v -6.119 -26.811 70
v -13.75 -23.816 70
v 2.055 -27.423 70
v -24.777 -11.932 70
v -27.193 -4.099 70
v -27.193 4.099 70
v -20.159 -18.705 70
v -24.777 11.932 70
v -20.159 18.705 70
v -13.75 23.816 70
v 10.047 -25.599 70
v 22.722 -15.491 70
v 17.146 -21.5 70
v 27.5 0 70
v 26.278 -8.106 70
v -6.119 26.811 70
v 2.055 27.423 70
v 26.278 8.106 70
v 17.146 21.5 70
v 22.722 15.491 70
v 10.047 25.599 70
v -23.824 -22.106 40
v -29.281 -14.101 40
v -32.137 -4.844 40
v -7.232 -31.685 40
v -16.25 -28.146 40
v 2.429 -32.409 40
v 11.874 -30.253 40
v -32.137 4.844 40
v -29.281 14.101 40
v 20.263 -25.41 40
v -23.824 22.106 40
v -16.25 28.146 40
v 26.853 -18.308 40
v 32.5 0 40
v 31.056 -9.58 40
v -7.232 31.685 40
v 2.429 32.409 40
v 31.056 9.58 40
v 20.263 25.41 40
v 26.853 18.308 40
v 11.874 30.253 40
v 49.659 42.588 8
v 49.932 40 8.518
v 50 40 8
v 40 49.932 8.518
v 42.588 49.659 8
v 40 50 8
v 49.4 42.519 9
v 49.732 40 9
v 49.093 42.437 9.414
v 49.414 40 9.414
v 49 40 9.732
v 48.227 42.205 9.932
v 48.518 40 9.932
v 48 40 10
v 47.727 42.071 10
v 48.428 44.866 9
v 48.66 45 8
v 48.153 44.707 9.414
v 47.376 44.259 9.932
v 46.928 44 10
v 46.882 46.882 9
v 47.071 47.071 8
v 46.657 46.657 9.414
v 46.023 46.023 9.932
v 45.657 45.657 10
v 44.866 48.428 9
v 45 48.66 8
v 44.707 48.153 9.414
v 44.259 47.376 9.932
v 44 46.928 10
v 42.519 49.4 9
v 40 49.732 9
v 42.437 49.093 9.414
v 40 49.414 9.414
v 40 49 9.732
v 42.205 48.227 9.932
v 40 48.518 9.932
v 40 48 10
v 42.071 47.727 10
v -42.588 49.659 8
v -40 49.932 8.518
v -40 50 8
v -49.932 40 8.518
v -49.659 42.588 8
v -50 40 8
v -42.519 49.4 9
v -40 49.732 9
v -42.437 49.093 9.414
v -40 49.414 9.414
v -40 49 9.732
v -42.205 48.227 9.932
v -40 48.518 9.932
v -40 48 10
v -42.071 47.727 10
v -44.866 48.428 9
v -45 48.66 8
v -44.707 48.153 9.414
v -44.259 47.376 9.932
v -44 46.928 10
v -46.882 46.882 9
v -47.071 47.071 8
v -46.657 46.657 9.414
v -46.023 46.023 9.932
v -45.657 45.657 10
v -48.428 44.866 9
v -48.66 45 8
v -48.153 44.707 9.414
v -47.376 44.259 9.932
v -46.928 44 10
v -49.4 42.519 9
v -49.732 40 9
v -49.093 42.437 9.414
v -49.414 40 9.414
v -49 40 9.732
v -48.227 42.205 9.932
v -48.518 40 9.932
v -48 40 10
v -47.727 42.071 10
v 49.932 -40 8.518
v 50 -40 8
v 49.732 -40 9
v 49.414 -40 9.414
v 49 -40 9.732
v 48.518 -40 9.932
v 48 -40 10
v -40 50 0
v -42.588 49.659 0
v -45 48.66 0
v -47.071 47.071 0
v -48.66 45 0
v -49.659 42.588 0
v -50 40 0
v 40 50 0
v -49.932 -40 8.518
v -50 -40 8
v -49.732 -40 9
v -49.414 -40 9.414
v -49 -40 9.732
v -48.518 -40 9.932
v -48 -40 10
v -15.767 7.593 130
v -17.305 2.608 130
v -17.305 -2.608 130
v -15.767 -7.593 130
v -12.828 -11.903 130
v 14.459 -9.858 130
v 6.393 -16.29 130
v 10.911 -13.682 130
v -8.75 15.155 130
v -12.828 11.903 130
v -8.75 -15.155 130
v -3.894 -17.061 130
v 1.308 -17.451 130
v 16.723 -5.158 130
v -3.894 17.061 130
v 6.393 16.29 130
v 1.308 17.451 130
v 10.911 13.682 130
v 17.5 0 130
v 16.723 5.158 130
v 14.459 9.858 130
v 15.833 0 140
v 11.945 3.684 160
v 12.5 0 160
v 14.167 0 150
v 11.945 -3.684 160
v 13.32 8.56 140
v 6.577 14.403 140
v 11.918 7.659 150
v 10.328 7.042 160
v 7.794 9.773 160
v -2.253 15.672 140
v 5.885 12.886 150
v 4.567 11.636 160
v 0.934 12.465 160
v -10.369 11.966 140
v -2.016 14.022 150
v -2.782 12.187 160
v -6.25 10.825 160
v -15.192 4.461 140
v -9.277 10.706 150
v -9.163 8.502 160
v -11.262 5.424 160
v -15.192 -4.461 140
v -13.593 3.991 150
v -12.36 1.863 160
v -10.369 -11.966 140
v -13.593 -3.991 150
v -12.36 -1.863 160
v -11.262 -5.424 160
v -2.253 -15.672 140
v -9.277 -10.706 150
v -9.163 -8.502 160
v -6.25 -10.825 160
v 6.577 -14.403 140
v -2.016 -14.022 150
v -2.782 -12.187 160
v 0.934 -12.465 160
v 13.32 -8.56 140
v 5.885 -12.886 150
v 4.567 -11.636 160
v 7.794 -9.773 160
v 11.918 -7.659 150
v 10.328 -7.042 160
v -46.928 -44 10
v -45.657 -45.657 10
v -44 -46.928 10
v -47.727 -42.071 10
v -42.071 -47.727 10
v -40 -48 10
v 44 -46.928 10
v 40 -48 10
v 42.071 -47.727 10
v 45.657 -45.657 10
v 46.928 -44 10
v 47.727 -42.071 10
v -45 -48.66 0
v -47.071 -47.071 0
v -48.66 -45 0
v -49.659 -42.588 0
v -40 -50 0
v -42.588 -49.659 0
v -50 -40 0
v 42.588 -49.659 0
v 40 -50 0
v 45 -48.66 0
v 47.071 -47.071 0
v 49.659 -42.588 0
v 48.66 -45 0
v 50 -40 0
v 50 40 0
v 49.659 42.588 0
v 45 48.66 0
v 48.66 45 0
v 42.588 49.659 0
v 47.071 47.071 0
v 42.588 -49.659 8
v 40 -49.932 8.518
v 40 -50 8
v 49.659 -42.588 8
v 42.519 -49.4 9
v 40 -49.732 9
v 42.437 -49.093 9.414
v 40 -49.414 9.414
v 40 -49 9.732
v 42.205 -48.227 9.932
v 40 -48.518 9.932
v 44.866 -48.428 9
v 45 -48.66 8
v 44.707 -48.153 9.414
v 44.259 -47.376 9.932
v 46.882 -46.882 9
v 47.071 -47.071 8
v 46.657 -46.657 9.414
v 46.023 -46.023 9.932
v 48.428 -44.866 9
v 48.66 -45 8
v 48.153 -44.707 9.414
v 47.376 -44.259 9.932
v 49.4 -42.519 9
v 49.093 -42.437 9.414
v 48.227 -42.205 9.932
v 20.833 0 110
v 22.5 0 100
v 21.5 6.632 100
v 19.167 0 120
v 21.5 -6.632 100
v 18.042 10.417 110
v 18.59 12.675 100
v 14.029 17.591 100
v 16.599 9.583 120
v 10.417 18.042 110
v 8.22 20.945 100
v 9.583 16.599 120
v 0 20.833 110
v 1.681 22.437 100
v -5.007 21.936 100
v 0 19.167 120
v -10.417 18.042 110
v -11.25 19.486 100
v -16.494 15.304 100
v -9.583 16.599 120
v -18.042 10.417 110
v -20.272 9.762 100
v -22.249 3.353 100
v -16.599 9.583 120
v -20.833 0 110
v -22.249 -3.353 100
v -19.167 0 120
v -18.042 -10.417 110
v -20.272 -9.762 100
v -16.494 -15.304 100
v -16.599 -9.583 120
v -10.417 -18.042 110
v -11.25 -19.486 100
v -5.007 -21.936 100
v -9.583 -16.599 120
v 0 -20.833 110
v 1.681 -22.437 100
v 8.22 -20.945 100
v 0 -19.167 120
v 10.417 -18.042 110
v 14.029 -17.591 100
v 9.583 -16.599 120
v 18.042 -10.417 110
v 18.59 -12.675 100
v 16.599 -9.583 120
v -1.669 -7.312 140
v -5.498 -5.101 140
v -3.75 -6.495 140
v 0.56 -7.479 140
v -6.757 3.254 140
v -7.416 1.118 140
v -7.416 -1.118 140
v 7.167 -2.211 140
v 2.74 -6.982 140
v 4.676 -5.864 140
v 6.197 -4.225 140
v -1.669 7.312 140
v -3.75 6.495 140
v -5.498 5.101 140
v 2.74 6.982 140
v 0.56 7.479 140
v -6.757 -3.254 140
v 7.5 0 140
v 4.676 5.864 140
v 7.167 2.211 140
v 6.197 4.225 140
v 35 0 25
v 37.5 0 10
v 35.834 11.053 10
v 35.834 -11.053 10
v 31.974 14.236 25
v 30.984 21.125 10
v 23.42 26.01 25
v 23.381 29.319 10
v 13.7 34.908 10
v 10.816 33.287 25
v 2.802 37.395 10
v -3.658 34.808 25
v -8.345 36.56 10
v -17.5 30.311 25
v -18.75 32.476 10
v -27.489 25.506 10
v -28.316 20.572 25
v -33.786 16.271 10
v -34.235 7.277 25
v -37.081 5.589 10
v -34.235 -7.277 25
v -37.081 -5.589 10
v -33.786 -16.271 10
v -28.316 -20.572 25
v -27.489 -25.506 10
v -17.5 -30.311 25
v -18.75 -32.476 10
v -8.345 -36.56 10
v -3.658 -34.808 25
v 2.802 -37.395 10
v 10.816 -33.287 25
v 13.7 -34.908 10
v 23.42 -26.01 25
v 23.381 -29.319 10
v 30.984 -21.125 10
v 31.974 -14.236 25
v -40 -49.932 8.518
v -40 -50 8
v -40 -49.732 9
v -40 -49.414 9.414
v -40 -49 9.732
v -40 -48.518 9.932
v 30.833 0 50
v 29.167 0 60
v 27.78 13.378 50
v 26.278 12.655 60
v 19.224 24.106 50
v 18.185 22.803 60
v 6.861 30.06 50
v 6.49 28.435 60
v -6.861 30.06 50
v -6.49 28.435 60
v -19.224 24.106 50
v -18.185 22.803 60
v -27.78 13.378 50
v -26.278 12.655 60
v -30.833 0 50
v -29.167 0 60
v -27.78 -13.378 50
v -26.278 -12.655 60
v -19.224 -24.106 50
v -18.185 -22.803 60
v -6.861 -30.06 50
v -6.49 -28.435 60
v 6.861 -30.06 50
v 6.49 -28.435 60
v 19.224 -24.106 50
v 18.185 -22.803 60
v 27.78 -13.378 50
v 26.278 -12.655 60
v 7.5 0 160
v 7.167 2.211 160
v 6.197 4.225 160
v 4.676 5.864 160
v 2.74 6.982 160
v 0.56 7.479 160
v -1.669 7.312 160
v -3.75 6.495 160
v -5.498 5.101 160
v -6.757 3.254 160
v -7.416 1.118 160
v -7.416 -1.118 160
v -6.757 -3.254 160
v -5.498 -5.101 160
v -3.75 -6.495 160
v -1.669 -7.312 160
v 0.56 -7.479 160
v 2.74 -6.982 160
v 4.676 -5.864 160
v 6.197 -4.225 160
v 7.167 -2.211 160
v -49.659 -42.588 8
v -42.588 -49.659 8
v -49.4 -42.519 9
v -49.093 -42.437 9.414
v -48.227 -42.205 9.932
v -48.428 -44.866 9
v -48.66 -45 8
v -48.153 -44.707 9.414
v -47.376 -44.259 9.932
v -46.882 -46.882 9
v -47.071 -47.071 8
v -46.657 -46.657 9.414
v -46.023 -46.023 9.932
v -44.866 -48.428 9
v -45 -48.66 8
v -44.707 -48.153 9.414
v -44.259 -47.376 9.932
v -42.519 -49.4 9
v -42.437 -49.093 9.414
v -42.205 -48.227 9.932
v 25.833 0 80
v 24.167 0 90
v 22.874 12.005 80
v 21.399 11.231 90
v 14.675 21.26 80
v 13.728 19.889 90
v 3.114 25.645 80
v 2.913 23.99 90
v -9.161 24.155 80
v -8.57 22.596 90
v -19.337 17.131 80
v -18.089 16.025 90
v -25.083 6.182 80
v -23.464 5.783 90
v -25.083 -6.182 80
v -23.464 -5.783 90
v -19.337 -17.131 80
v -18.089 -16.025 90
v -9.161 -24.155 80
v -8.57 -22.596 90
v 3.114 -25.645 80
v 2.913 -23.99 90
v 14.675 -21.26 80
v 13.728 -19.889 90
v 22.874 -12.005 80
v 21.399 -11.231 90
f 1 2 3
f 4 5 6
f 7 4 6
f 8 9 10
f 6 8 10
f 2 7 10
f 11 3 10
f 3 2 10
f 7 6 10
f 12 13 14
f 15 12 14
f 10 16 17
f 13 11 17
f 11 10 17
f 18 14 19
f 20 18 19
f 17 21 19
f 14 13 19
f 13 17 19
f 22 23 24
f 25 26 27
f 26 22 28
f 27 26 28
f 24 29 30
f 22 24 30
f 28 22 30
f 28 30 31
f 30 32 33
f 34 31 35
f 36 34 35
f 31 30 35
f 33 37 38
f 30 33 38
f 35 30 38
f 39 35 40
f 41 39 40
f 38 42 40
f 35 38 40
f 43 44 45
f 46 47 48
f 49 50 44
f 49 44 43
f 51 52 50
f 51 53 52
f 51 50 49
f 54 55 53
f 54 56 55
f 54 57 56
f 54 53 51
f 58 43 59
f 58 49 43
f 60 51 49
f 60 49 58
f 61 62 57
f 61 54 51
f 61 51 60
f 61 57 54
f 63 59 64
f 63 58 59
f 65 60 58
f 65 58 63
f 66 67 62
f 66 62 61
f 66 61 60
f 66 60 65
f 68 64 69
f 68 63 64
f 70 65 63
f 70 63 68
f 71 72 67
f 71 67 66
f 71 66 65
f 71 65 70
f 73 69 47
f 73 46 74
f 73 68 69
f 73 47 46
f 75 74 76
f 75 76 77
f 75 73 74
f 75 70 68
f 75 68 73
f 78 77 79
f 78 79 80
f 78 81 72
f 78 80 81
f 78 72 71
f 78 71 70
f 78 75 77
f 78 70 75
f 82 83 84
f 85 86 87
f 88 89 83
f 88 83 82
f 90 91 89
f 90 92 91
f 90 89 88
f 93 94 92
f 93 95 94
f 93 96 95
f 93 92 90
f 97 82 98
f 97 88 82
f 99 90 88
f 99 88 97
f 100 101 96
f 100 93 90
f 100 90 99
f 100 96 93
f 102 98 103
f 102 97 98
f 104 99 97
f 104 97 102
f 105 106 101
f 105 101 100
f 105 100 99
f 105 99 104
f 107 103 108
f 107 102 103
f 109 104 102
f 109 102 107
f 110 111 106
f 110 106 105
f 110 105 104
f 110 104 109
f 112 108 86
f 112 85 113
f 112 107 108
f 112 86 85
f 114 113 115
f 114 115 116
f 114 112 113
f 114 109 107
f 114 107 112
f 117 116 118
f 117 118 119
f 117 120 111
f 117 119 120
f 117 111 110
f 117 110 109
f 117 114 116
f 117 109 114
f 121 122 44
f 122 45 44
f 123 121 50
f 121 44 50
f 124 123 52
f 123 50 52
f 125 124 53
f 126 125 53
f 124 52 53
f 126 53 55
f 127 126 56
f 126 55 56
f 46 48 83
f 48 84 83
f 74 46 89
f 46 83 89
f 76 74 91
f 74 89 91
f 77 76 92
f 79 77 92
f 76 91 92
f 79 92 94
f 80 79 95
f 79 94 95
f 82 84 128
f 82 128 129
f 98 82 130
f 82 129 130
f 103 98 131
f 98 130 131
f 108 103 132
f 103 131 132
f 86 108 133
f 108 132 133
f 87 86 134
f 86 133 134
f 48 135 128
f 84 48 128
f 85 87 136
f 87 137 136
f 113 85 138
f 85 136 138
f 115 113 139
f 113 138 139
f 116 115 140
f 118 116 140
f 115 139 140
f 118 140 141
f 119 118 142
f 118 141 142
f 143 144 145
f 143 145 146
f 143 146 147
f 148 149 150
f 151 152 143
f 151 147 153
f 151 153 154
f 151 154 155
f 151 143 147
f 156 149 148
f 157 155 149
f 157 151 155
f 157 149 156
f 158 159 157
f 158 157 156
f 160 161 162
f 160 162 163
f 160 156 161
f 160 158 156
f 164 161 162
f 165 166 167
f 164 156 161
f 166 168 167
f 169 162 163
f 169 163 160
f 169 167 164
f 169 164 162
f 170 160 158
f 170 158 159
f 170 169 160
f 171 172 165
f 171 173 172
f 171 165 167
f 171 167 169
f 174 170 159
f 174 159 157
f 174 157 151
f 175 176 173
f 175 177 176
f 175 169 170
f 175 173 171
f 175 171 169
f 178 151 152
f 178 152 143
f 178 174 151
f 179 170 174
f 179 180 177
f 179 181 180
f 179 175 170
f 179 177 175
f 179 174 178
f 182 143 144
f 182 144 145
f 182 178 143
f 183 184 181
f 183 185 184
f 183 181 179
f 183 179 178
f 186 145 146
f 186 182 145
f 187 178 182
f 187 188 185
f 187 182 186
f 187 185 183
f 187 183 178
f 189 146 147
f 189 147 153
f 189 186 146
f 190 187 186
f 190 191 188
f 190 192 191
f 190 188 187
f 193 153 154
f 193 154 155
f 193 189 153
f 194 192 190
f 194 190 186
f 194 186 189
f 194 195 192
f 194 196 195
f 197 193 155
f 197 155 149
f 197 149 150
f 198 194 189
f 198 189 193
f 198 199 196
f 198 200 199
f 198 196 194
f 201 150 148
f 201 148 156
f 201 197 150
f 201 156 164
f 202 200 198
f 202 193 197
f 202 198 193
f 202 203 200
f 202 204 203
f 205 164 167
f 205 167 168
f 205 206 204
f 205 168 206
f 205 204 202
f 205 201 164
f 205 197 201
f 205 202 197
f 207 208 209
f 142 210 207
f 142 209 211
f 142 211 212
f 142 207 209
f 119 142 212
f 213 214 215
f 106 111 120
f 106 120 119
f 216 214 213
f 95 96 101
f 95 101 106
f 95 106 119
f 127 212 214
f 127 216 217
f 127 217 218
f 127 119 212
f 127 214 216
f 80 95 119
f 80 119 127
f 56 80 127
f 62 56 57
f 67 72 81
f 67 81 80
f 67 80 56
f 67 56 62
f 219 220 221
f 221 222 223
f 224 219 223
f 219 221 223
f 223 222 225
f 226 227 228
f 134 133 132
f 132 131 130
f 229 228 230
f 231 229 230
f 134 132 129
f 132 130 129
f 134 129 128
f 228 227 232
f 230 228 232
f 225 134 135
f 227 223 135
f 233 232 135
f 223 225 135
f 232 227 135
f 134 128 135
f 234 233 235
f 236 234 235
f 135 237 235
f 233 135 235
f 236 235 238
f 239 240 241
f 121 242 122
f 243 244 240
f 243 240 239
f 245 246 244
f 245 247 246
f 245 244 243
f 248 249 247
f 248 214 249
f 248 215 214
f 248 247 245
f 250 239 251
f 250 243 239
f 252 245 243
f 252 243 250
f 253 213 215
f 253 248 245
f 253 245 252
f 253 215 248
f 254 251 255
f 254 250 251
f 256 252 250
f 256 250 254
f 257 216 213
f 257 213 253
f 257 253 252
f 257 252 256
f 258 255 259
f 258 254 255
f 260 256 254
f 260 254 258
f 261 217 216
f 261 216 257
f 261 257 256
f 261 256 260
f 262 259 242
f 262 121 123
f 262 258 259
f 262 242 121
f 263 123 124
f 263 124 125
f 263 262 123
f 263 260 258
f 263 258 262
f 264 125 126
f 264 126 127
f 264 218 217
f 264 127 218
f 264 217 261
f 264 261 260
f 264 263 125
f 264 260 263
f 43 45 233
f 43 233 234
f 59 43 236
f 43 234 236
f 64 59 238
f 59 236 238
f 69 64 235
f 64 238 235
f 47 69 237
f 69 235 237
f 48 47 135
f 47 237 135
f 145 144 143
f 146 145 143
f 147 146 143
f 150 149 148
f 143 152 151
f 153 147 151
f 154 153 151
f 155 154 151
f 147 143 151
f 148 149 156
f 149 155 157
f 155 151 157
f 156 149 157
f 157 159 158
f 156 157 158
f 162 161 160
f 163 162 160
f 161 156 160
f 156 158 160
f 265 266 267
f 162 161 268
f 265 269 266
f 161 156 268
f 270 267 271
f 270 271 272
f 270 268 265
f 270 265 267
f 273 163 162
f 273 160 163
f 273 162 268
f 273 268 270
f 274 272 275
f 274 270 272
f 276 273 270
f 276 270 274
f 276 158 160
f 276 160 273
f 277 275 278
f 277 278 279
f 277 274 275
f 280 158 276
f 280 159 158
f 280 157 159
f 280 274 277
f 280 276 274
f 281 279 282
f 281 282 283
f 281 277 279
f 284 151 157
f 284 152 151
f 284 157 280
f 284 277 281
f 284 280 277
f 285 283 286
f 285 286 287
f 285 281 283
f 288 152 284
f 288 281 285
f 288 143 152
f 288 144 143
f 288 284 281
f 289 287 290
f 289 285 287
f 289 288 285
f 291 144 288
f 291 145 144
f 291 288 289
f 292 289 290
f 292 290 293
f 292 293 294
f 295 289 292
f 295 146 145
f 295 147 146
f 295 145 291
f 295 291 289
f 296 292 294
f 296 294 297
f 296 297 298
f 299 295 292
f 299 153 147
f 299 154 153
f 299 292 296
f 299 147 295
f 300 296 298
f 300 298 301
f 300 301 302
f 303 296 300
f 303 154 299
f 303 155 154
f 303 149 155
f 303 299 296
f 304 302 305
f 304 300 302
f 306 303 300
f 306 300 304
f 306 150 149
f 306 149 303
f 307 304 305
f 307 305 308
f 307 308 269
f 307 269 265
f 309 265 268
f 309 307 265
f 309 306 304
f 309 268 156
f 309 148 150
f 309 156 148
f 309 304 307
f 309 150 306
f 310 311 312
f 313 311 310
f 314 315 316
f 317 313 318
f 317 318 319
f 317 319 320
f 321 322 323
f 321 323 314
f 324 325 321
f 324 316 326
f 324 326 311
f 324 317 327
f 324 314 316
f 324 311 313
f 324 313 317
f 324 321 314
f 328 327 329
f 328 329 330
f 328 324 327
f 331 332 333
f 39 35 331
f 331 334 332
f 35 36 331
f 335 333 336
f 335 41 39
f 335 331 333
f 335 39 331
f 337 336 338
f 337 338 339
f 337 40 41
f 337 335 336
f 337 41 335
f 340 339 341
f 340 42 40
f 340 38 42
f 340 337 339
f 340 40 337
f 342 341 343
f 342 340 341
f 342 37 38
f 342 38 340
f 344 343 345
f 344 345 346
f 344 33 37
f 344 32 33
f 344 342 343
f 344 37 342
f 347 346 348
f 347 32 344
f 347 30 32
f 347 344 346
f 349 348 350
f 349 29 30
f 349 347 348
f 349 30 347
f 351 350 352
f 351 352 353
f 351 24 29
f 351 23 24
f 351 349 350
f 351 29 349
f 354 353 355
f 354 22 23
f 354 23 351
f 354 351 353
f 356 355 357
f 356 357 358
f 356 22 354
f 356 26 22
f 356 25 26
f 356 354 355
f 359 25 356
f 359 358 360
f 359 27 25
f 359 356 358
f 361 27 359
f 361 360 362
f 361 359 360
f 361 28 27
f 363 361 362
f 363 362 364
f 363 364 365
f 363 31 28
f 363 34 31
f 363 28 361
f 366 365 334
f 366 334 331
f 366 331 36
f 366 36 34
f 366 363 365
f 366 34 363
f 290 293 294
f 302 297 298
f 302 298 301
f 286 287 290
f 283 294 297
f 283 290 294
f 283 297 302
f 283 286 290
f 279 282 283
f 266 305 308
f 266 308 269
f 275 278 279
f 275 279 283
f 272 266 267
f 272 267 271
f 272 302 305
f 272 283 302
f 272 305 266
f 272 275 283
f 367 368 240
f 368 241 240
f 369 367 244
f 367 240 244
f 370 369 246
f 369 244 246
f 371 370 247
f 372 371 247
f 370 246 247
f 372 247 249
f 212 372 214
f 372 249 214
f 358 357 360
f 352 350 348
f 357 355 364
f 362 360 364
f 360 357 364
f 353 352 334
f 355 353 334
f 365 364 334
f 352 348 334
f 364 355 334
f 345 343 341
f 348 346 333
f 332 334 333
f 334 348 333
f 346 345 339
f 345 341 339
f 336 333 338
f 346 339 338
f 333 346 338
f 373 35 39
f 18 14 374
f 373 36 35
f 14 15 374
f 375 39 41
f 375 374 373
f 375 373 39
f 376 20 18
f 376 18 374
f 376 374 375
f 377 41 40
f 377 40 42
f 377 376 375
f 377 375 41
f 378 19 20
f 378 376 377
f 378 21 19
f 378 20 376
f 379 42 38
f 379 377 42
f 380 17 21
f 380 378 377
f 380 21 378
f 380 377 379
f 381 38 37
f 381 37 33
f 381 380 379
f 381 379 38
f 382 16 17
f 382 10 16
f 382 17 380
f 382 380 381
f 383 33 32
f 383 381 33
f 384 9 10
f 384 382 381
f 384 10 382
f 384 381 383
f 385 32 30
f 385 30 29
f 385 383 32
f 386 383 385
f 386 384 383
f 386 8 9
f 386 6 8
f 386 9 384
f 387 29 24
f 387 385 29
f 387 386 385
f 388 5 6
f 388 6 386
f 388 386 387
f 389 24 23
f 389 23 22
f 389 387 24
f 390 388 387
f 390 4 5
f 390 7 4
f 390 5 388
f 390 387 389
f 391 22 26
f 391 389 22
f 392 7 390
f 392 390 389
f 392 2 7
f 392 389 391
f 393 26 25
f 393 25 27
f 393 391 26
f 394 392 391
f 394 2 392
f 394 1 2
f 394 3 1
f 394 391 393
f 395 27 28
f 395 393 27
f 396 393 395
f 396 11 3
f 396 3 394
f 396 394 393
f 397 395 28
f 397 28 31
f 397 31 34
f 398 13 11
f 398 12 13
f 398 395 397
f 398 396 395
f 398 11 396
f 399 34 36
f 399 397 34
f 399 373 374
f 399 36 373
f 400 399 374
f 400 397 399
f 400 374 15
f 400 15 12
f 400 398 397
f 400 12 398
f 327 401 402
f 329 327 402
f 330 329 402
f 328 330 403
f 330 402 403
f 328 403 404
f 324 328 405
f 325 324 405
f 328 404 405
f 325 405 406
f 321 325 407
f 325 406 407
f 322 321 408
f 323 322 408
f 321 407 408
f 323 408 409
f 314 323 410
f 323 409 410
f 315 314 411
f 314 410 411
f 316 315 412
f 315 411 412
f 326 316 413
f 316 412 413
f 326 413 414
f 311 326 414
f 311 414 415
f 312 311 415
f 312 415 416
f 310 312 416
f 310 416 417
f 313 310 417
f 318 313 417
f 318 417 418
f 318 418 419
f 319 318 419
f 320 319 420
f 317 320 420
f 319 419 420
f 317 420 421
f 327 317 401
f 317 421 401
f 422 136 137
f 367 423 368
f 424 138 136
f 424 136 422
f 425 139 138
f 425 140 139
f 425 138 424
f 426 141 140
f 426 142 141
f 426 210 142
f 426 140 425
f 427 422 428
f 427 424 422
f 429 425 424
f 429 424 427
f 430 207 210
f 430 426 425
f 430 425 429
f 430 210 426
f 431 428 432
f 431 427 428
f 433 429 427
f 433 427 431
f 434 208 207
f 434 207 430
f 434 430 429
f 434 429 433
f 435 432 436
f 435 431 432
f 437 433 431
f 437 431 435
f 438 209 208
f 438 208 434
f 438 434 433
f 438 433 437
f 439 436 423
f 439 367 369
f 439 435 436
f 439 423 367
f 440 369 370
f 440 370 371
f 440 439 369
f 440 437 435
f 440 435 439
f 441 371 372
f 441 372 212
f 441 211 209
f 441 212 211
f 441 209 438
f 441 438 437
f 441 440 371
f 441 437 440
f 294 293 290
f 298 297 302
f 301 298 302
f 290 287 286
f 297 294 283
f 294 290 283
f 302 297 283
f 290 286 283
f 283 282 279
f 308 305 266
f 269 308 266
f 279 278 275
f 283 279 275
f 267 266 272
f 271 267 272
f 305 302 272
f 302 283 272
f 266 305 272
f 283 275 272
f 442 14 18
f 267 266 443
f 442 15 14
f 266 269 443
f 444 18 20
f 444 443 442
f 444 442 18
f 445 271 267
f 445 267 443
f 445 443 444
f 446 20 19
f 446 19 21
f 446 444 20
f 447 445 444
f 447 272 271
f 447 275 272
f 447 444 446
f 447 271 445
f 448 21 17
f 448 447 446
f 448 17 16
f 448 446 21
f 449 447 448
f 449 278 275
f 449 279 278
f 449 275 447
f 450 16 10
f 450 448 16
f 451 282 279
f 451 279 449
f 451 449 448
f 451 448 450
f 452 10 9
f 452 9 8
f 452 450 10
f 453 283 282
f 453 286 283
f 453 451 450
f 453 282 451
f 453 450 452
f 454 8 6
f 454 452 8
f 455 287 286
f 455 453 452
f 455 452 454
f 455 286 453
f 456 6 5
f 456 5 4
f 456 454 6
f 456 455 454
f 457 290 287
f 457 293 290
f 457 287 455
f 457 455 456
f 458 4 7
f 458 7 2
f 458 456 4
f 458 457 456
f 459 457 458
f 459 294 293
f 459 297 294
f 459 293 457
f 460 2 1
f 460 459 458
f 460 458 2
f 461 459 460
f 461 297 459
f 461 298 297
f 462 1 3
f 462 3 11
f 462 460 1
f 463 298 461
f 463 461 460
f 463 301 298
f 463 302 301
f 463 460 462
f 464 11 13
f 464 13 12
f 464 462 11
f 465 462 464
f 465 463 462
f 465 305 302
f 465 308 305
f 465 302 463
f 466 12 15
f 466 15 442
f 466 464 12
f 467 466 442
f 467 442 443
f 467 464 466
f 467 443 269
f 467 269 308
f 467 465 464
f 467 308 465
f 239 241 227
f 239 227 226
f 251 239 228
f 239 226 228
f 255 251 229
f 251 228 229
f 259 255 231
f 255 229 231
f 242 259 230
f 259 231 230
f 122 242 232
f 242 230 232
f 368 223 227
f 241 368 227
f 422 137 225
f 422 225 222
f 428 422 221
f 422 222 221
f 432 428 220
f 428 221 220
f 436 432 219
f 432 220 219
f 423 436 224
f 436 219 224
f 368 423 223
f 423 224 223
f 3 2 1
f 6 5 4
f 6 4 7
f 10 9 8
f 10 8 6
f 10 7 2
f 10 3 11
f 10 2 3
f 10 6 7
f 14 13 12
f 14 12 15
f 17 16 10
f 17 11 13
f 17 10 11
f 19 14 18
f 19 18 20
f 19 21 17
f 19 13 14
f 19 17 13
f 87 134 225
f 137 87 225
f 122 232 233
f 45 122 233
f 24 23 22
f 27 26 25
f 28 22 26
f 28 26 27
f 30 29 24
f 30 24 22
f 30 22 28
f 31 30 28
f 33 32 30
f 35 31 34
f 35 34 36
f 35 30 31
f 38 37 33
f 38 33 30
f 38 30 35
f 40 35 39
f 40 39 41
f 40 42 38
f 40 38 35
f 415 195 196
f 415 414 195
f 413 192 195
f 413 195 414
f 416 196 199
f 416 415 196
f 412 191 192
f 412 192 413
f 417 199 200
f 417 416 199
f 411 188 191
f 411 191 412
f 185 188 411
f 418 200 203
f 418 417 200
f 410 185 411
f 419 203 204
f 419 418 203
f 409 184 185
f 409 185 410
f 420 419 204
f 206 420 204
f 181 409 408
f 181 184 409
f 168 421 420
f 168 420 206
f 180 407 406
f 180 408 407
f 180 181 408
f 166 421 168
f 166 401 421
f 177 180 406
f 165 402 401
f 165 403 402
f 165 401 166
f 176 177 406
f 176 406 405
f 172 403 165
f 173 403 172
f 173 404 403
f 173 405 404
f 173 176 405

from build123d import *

# Parameters (mm, degrees)
F1_DEPTH   = 10
F2_R       = 37.5
F4_R       = 32.5
F5_FACE_R  = 32.5
F7_R       = 27.5
F8_FACE_R  = 27.5
F10_R      = 22.5
F11_FACE_R = 22.5
F13_R      = 17.5
F14_FACE_R = 17.5
F16_R      = 12.5
F18_R      = 2
F19_R      = 7.5
F20_DEPTH  = 20


with BuildPart() as f1:
    # F0 (on Top) → F1 (new body)
    with BuildSketch(Plane.XY):
        with BuildLine():
            Line((40, 50), (-40, 50))
            ThreePointArc((-40, 50), (-47.0710678119, 47.0710678119), (-50, 40))
            Line((-50, 40), (-50, -40))
            ThreePointArc((-50, -40), (-47.0710678119, -47.0710678119), (-40, -50))
            Line((-40, -50), (40, -50))
            ThreePointArc((40, -50), (47.0710678119, -47.0710678119), (50, -40))
            Line((50, -40), (50, 40))
            ThreePointArc((50, 40), (47.0710678119, 47.0710678119), (40, 50))
        make_face()
    extrude(amount=F1_DEPTH)

    # F18
    f18_edges = [f1.edges().sort_by_distance(p)[0] for p in [
        (0, -50, 10),
        (-47.071068, -47.071068, 10),
        (-50, 0, 10),
        (47.071068, -47.071068, 10),
        (50, 0, 10),
        (47.071068, 47.071068, 10),
        (0, 50, 10),
        (-47.071068, 47.071068, 10),
    ]]
    fillet(f18_edges, radius=F18_R)


with BuildPart() as f5:
    # F2 (on face) → F5 section 0
    with BuildSketch(Plane.XY.offset(10)):
        Circle(F2_R)
    # F4 (on offset) → F5 section 1
    with BuildSketch(Plane.XY.offset(40)):
        Circle(F4_R)
    loft()


with BuildPart() as f8:
    # F5_face (on face) → F8 section 0
    with BuildSketch(Plane.XY.offset(40)):
        Circle(F5_FACE_R)
    # F7 (on offset) → F8 section 1
    with BuildSketch(Plane.XY.offset(70)):
        Circle(F7_R)
    loft()


with BuildPart() as f11:
    # F8_face (on face) → F11 section 0
    with BuildSketch(Plane.XY.offset(70)):
        Circle(F8_FACE_R)
    # F10 (on offset) → F11 section 1
    with BuildSketch(Plane.XY.offset(100)):
        Circle(F10_R)
    loft()


with BuildPart() as f14:
    # F11_face (on face) → F14 section 0
    with BuildSketch(Plane.XY.offset(100)):
        Circle(F11_FACE_R)
    # F13 (on offset) → F14 section 1
    with BuildSketch(Plane.XY.offset(130)):
        Circle(F13_R)
    loft()


with BuildPart() as f17:
    # F14_face (on face) → F17 section 0
    with BuildSketch(Plane.XY.offset(130)):
        Circle(F14_FACE_R)
    # F16 (on offset) → F17 section 1
    with BuildSketch(Plane.XY.offset(160)):
        Circle(F16_R)
    loft()

    # F19 (on face) → F20 (cut)
    with BuildSketch(Plane.XY.offset(160)):
        Circle(F19_R)
    extrude(amount=-F20_DEPTH, mode=Mode.SUBTRACT)


solid = Compound([f1.part, f5.part, f8.part, f11.part, f14.part, f17.part])
